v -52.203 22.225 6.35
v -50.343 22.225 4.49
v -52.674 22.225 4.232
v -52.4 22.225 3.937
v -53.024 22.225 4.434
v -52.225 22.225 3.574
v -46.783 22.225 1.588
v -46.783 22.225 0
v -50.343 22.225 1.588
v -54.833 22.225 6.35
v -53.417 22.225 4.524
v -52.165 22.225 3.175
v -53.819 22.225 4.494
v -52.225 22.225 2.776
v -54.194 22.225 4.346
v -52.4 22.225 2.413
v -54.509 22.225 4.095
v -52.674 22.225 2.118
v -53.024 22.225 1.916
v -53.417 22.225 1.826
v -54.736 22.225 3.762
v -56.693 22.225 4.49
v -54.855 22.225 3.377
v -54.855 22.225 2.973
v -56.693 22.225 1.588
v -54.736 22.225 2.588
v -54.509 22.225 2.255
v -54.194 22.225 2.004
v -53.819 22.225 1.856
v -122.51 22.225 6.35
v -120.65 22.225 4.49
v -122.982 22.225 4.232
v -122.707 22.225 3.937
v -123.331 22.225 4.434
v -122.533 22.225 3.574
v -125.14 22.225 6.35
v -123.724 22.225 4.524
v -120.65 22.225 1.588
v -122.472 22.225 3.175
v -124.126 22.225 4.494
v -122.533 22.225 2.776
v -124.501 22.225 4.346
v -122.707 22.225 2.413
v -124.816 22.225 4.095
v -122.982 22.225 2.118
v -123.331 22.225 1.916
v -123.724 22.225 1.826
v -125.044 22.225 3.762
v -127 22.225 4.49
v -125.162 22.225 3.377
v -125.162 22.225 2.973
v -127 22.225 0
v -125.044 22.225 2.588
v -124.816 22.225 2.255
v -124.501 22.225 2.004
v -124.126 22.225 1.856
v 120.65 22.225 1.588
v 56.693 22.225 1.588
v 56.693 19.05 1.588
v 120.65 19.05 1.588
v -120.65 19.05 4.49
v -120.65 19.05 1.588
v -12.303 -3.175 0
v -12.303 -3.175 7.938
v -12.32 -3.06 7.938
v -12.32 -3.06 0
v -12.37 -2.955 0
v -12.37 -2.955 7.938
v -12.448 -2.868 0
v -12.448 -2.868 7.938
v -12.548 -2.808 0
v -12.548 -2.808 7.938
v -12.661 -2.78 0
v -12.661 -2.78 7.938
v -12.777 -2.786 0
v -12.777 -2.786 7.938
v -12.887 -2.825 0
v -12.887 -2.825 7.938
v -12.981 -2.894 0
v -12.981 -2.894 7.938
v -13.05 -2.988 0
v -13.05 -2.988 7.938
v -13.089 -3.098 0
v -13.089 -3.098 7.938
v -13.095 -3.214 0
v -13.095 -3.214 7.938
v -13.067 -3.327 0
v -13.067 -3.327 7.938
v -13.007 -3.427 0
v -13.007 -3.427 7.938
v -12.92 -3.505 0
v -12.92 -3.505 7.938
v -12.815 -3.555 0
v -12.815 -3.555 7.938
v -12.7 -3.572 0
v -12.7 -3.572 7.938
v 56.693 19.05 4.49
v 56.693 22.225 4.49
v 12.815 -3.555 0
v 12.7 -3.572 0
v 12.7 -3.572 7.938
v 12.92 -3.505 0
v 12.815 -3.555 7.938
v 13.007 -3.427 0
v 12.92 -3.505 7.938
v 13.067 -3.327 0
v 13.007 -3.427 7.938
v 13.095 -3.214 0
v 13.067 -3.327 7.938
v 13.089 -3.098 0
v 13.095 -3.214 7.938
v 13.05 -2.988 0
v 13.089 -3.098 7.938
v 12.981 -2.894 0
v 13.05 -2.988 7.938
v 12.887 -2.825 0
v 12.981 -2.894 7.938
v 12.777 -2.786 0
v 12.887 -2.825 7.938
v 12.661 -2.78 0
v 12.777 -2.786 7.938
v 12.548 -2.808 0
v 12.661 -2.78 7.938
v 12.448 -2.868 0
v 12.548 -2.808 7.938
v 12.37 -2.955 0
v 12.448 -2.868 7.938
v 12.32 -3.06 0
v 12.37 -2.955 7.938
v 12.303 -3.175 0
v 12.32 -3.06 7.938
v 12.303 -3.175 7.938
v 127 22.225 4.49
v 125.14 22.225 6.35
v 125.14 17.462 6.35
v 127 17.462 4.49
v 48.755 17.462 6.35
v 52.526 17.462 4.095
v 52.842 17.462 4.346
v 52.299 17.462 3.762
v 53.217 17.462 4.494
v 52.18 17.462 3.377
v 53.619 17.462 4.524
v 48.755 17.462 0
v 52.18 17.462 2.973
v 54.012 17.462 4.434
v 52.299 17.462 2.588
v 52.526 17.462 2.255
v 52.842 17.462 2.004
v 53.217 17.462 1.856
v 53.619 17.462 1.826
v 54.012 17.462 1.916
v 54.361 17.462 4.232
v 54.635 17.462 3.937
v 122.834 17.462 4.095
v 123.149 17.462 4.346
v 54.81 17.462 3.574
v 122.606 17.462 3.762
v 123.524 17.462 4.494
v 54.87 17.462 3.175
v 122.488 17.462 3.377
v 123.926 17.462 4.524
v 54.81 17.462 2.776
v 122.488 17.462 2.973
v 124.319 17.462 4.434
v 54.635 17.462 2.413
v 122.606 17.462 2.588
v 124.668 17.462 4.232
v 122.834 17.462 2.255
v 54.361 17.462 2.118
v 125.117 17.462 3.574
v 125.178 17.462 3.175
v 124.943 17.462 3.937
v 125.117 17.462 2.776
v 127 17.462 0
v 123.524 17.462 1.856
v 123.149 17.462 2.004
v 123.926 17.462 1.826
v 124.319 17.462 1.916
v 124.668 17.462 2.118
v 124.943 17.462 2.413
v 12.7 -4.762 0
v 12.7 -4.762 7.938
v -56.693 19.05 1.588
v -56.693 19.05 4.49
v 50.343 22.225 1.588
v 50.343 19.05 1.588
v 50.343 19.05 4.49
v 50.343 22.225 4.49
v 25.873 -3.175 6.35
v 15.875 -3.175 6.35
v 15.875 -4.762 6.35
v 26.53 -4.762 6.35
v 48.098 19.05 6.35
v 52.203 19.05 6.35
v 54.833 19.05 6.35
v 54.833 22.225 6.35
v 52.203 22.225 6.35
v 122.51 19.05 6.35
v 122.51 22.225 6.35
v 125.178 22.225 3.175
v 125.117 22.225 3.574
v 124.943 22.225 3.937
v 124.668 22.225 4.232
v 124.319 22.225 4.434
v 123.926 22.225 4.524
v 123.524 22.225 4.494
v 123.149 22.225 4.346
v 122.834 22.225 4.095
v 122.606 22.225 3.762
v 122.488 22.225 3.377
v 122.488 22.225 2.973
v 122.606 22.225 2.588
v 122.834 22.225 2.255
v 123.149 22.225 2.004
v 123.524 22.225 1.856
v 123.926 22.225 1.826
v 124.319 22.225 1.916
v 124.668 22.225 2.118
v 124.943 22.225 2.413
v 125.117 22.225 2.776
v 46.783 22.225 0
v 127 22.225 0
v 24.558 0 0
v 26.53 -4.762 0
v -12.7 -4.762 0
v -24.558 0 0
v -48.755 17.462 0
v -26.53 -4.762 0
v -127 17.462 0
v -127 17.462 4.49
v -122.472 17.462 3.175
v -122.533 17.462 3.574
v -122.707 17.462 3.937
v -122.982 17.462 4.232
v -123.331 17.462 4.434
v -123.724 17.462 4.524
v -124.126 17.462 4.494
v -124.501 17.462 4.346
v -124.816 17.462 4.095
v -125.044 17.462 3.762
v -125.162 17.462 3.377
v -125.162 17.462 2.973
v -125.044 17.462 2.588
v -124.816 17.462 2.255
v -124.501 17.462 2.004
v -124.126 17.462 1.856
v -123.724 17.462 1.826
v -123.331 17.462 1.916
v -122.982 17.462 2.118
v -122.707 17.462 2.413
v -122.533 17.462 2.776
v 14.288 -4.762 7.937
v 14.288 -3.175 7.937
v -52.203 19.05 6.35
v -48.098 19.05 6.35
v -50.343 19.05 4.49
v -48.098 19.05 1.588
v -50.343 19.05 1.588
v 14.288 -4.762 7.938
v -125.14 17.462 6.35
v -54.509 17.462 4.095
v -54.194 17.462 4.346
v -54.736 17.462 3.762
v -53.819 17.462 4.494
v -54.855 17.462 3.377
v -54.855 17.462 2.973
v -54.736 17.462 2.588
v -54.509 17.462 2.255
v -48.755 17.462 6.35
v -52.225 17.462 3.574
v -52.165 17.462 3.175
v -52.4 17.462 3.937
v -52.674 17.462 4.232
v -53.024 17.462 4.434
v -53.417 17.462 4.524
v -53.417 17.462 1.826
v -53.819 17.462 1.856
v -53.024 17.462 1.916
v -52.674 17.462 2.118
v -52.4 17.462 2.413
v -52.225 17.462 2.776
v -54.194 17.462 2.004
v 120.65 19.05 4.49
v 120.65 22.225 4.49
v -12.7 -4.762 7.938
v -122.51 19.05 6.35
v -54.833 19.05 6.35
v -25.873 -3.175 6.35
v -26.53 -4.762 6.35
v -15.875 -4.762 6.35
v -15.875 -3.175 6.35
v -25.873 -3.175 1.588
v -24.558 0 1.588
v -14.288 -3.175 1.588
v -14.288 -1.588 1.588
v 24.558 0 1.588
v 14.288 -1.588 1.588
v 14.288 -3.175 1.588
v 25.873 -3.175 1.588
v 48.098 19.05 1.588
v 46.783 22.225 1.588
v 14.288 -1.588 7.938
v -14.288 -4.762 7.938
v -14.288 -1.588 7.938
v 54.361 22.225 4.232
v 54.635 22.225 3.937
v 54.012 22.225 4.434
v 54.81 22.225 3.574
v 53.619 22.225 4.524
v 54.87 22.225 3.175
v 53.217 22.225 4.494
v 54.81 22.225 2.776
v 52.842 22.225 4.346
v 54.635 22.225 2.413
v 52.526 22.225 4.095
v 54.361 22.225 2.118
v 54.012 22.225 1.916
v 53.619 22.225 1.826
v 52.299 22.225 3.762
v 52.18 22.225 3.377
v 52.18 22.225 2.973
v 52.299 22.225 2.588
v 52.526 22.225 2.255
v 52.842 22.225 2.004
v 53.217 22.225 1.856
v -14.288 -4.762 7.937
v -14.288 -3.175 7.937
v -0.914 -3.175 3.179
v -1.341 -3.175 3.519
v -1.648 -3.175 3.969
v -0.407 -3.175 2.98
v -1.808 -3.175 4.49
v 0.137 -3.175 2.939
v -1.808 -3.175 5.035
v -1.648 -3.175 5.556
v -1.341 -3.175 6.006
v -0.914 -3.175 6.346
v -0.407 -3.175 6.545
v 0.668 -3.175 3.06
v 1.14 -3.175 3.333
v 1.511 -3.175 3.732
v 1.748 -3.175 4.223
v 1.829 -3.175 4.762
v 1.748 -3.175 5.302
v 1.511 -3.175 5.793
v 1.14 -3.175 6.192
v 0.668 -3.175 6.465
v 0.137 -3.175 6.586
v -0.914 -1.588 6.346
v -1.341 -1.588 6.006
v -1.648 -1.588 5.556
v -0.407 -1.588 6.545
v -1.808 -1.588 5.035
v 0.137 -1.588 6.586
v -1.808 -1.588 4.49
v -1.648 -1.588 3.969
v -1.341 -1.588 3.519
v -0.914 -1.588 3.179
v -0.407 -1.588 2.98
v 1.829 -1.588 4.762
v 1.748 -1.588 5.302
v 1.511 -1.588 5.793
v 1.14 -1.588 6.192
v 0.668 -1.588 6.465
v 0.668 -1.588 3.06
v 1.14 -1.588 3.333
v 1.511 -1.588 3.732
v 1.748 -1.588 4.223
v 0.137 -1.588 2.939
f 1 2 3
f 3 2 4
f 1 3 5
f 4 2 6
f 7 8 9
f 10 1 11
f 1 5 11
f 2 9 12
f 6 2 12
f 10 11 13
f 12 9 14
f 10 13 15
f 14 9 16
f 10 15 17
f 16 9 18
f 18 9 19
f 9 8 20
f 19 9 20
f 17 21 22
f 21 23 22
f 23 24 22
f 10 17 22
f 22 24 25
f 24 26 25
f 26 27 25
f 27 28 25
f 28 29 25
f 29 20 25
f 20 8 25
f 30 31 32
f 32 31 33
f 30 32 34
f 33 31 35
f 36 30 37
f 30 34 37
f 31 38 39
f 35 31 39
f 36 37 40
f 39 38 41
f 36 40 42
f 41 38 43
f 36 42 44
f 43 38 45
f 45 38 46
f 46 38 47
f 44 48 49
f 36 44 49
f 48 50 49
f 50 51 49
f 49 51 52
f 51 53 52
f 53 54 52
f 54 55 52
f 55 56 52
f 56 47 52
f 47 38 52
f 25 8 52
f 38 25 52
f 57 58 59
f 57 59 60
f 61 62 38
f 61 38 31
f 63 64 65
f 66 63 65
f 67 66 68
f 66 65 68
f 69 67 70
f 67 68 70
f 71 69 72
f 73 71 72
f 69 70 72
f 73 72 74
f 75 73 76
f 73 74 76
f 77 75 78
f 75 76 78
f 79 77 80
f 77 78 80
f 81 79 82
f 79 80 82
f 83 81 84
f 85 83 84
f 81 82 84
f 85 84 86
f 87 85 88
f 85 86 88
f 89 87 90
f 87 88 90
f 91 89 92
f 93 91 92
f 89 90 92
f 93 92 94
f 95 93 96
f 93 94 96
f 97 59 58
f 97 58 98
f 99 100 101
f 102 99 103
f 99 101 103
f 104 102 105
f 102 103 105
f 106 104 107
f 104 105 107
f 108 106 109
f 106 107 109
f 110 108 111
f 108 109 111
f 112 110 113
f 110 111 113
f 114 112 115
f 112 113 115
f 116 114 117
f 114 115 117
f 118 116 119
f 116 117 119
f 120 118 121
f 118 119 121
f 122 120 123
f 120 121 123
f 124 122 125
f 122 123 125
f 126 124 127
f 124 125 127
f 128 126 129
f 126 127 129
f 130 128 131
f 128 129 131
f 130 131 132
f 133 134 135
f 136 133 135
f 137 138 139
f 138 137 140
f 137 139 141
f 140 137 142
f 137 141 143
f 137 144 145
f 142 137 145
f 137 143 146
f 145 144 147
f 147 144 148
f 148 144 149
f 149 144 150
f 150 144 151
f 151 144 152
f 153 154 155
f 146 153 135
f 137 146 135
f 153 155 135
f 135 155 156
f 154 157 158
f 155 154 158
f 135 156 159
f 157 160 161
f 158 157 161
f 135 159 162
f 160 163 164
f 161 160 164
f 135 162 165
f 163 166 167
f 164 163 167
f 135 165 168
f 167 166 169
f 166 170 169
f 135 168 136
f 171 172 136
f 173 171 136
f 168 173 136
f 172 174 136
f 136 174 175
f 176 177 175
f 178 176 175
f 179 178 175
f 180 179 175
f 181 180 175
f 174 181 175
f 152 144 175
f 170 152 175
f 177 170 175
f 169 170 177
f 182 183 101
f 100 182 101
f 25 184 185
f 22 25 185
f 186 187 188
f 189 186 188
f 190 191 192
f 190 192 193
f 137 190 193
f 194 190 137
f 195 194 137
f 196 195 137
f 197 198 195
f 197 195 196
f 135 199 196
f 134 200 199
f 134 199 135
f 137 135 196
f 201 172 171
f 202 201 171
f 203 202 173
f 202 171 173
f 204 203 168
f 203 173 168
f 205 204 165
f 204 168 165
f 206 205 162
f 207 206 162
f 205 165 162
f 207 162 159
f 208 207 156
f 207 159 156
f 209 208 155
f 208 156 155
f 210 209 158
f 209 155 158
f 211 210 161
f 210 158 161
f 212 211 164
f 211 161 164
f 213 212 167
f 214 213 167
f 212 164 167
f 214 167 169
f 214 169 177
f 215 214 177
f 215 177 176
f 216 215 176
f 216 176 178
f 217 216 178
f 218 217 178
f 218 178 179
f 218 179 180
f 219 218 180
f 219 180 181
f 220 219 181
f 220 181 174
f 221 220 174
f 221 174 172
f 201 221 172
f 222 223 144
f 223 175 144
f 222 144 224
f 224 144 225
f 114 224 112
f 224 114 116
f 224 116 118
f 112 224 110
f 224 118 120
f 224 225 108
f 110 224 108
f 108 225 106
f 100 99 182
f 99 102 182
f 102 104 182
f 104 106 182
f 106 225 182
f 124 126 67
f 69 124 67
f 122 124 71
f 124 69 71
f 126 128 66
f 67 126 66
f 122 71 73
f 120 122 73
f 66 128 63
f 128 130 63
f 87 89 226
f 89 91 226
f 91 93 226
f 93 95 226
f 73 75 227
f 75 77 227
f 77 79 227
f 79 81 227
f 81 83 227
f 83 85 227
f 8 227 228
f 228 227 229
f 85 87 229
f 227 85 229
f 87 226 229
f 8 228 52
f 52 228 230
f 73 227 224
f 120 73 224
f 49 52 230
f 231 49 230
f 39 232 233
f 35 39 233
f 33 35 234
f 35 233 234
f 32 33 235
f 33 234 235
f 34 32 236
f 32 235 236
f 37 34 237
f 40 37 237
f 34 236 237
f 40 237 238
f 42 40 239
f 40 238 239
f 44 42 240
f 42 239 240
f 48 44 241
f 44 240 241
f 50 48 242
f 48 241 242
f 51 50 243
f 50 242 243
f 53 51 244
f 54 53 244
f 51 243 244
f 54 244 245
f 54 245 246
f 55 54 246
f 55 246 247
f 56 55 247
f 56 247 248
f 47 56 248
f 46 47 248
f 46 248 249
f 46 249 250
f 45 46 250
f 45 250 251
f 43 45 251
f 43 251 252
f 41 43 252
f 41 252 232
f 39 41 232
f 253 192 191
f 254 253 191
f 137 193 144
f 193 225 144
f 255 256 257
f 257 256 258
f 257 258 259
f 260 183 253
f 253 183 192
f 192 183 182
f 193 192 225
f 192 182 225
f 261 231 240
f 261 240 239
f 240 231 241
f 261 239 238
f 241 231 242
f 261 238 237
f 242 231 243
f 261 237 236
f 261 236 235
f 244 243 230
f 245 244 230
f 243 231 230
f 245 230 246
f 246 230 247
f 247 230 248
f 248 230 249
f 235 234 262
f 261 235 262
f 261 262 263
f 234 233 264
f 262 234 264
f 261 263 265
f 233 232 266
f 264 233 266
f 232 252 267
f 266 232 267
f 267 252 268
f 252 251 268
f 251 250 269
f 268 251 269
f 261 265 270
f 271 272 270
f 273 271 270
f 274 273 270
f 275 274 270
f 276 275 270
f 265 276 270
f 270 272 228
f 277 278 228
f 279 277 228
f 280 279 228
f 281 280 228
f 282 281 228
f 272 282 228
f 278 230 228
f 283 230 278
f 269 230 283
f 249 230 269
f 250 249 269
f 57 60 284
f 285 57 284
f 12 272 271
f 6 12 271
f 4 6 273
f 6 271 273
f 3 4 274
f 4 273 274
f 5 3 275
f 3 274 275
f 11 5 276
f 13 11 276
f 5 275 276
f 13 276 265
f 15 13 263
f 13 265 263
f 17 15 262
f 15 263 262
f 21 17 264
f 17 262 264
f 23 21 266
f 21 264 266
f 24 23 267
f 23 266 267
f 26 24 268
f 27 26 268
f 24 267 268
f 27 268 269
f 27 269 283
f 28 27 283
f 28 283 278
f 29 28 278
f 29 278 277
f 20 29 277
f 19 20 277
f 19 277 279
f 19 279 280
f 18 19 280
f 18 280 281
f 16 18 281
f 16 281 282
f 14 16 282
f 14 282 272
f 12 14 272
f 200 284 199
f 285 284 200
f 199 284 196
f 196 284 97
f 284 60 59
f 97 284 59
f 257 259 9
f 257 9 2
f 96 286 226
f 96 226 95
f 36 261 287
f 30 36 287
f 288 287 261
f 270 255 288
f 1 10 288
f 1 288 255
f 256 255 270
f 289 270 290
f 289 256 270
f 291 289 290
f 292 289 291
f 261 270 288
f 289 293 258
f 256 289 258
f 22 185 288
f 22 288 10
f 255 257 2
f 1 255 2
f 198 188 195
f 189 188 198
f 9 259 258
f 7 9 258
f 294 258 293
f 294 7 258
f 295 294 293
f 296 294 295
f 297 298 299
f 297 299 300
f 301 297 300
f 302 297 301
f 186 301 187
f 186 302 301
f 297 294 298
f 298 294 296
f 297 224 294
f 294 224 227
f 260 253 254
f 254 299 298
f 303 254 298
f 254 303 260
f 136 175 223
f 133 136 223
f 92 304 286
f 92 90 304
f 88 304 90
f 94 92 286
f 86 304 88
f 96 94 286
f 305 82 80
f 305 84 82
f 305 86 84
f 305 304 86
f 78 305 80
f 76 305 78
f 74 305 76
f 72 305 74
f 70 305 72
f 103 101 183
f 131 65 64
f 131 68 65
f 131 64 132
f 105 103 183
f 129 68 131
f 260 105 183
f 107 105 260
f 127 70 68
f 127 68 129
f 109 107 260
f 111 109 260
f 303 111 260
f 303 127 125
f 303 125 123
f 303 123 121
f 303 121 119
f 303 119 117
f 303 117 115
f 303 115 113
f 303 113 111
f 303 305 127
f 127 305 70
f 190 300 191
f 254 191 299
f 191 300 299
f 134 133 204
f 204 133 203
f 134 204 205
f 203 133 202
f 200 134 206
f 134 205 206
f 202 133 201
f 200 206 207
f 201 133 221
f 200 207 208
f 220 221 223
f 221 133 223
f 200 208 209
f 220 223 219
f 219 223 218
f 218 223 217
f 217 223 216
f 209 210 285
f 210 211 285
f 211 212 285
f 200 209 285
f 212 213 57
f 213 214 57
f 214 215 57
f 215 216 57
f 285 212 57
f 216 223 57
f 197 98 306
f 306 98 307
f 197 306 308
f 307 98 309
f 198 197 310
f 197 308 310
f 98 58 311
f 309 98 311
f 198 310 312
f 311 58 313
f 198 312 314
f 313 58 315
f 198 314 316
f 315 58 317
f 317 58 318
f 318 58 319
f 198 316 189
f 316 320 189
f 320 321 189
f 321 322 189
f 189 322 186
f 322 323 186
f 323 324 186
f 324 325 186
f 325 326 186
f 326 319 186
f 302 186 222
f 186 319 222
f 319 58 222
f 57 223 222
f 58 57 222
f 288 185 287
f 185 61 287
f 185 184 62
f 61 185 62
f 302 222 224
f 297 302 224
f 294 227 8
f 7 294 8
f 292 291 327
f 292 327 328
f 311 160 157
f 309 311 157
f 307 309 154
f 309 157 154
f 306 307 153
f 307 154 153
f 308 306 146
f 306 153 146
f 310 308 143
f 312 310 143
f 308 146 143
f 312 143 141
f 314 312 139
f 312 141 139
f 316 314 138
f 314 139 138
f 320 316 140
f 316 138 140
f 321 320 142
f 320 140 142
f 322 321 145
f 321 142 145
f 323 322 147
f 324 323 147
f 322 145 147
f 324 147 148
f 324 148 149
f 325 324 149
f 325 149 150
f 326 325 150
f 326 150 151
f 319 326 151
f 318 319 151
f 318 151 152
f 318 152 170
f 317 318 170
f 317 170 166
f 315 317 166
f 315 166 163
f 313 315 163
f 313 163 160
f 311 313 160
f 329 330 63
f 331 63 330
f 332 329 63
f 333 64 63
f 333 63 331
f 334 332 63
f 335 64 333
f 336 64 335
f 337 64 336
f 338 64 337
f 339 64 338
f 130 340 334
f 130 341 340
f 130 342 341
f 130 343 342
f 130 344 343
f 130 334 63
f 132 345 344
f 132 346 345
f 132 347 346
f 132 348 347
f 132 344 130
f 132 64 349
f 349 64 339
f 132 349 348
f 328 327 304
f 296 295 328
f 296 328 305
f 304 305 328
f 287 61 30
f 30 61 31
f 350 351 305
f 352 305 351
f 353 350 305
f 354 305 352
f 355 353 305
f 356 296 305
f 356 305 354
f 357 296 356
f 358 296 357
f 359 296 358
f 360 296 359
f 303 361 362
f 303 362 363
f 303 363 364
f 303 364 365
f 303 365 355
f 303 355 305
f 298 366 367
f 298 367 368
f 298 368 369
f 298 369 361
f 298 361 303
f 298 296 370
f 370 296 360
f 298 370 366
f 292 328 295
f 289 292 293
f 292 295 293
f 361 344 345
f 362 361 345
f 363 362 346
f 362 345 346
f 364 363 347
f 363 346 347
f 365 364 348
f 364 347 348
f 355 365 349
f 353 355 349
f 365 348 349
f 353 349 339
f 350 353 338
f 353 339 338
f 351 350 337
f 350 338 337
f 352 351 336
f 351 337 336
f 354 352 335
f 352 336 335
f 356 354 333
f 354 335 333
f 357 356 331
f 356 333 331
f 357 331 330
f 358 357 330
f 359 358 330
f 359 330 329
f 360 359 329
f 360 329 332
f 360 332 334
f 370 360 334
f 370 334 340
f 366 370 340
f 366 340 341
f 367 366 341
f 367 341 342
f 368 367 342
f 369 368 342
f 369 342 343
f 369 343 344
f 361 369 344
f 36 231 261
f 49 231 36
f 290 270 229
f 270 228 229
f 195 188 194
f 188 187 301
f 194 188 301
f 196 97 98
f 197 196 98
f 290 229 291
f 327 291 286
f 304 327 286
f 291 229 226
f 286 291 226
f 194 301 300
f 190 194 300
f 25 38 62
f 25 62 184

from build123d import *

# Parameters (mm, degrees)
F1_DEPTH  = 1.5875
F3_DEPTH  = 4.7625
F4_W      = 6.35
F4_H      = 6.35
F5_DEPTH  = 3.175
F6_SIZE   = 1.8598642
F7_W      = 28.575
F7_H      = 3.175
F8_DEPTH  = 1.5875
F9_W      = 25.4
F9_H      = 1.5875
F10_DEPTH = 7.9375
F11_R     = 1.35255
F11_R_2   = 1.8288
F12_DEPTH = 25.4
F13_SIZE  = 1.58749
F14_R     = 0.396875
F15_DEPTH = 7.9375


# Not quite as in the source:
# - a fillet or chamfer is up to 0.001 mm smaller than in the source, because OpenCascade refuses the exact size


with BuildPart() as f1:
    # F0 (on Top) → F1 (new body)
    with BuildSketch(Plane.XY):
        Polygon((-46.7826079092, 22.225), (-127, 22.225), (-127, 17.4625), (-48.7553, 17.4625), (-26.5303, -4.7625), (26.5303, -4.7625), (48.7553, 17.4625), (127, 17.4625), (127, 22.225), (46.7826079092, 22.225), (24.5576079092, 0), (-24.5576079092, 0), align=None)
    extrude(amount=F1_DEPTH)

    # F2 (on face) → F3 (join)
    with BuildSketch(Plane.XY.offset(1.5875)):
        Polygon((-127, 19.05), (-127, 17.4625), (-48.7553, 17.4625), (-26.5303, -4.7625), (26.5303, -4.7625), (48.7553, 17.4625), (127, 17.4625), (127, 19.05), (48.0977359697, 19.05), (25.8727359697, -3.175), (14.2875, -3.175), (14.2875, -1.5875), (-14.2875, -1.5875), (-14.2875, -3.175), (-25.8727359697, -3.175), (-48.0977359697, 19.05), align=None)
    extrude(amount=F3_DEPTH)

    # F4 (on face) → F5 (join, through all)
    with BuildSketch(Plane(origin=(0, 19.05, 0), x_dir=(-1, 0, 0), z_dir=(0, 1, 0))):
        with Locations((-53.5178, 3.175)):
            Rectangle(F4_W, F4_H)
        with Locations((-123.825, 3.175)):
            Rectangle(F4_W, F4_H)
        with Locations((123.825, 3.175)):
            Rectangle(F4_W, F4_H)
        with Locations((53.5178, 3.175)):
            Rectangle(F4_W, F4_H)
    extrude(amount=F5_DEPTH)

    # F6
    f6_edges = [f1.edges().sort_by_distance(p)[0] for p in [
        (-127, 19.84375, 6.35),
        (-120.65, 20.6375, 6.35),
        (-56.6928, 20.6375, 6.35),
        (-50.3428, 20.6375, 6.35),
        (50.3428, 20.6375, 6.35),
        (56.6928, 20.6375, 6.35),
        (120.65, 20.6375, 6.35),
        (127, 19.84375, 6.35),
    ]]
    chamfer(f6_edges, length=F6_SIZE)

    # F7 (on face) → F8 (join)
    with BuildSketch(Plane.XY.offset(6.35)):
        with Locations((0, -3.175)):
            Rectangle(F7_W, F7_H)
    extrude(amount=F8_DEPTH)

    # F9 (on face) → F10 (cut, through all)
    with BuildSketch(Plane.XY.offset(7.9375)):
        with Locations((0, -3.96875)):
            Rectangle(F9_W, F9_H)
    extrude(amount=-F10_DEPTH, mode=Mode.SUBTRACT)

    # F11 (on face) → F12 (cut, through all)
    with BuildSketch(Plane.XZ.offset(3.175)):
        with Locations((53.5178, 3.175)):
            Circle(F11_R)
        with Locations((123.825, 3.175)):
            Circle(F11_R)
        with Locations((-123.825, 3.175)):
            Circle(F11_R)
        with Locations((-53.5178, 3.175)):
            Circle(F11_R)
        with Locations((0, 4.7625)):
            Circle(F11_R_2)
    extrude(amount=-F12_DEPTH, mode=Mode.SUBTRACT)

    # F13 (size 1.5875 in the source; OpenCascade refuses exactly that, so slightly less here)
    f13_edges = [f1.edges().sort_by_distance(p)[0] for p in [
        (-14.2875, -3.96875, 6.35),
        (14.2875, -3.96875, 6.35),
    ]]
    chamfer(f13_edges, length=F13_SIZE)

    # F14 (on face) → F15 (cut, through all)
    with BuildSketch(Plane.XY.offset(7.9375)):
        with Locations((-12.7, -3.175)):
            Circle(F14_R)
        with Locations((12.7, -3.175)):
            Circle(F14_R)
    extrude(amount=-F15_DEPTH, mode=Mode.SUBTRACT)


solid = f1.part
